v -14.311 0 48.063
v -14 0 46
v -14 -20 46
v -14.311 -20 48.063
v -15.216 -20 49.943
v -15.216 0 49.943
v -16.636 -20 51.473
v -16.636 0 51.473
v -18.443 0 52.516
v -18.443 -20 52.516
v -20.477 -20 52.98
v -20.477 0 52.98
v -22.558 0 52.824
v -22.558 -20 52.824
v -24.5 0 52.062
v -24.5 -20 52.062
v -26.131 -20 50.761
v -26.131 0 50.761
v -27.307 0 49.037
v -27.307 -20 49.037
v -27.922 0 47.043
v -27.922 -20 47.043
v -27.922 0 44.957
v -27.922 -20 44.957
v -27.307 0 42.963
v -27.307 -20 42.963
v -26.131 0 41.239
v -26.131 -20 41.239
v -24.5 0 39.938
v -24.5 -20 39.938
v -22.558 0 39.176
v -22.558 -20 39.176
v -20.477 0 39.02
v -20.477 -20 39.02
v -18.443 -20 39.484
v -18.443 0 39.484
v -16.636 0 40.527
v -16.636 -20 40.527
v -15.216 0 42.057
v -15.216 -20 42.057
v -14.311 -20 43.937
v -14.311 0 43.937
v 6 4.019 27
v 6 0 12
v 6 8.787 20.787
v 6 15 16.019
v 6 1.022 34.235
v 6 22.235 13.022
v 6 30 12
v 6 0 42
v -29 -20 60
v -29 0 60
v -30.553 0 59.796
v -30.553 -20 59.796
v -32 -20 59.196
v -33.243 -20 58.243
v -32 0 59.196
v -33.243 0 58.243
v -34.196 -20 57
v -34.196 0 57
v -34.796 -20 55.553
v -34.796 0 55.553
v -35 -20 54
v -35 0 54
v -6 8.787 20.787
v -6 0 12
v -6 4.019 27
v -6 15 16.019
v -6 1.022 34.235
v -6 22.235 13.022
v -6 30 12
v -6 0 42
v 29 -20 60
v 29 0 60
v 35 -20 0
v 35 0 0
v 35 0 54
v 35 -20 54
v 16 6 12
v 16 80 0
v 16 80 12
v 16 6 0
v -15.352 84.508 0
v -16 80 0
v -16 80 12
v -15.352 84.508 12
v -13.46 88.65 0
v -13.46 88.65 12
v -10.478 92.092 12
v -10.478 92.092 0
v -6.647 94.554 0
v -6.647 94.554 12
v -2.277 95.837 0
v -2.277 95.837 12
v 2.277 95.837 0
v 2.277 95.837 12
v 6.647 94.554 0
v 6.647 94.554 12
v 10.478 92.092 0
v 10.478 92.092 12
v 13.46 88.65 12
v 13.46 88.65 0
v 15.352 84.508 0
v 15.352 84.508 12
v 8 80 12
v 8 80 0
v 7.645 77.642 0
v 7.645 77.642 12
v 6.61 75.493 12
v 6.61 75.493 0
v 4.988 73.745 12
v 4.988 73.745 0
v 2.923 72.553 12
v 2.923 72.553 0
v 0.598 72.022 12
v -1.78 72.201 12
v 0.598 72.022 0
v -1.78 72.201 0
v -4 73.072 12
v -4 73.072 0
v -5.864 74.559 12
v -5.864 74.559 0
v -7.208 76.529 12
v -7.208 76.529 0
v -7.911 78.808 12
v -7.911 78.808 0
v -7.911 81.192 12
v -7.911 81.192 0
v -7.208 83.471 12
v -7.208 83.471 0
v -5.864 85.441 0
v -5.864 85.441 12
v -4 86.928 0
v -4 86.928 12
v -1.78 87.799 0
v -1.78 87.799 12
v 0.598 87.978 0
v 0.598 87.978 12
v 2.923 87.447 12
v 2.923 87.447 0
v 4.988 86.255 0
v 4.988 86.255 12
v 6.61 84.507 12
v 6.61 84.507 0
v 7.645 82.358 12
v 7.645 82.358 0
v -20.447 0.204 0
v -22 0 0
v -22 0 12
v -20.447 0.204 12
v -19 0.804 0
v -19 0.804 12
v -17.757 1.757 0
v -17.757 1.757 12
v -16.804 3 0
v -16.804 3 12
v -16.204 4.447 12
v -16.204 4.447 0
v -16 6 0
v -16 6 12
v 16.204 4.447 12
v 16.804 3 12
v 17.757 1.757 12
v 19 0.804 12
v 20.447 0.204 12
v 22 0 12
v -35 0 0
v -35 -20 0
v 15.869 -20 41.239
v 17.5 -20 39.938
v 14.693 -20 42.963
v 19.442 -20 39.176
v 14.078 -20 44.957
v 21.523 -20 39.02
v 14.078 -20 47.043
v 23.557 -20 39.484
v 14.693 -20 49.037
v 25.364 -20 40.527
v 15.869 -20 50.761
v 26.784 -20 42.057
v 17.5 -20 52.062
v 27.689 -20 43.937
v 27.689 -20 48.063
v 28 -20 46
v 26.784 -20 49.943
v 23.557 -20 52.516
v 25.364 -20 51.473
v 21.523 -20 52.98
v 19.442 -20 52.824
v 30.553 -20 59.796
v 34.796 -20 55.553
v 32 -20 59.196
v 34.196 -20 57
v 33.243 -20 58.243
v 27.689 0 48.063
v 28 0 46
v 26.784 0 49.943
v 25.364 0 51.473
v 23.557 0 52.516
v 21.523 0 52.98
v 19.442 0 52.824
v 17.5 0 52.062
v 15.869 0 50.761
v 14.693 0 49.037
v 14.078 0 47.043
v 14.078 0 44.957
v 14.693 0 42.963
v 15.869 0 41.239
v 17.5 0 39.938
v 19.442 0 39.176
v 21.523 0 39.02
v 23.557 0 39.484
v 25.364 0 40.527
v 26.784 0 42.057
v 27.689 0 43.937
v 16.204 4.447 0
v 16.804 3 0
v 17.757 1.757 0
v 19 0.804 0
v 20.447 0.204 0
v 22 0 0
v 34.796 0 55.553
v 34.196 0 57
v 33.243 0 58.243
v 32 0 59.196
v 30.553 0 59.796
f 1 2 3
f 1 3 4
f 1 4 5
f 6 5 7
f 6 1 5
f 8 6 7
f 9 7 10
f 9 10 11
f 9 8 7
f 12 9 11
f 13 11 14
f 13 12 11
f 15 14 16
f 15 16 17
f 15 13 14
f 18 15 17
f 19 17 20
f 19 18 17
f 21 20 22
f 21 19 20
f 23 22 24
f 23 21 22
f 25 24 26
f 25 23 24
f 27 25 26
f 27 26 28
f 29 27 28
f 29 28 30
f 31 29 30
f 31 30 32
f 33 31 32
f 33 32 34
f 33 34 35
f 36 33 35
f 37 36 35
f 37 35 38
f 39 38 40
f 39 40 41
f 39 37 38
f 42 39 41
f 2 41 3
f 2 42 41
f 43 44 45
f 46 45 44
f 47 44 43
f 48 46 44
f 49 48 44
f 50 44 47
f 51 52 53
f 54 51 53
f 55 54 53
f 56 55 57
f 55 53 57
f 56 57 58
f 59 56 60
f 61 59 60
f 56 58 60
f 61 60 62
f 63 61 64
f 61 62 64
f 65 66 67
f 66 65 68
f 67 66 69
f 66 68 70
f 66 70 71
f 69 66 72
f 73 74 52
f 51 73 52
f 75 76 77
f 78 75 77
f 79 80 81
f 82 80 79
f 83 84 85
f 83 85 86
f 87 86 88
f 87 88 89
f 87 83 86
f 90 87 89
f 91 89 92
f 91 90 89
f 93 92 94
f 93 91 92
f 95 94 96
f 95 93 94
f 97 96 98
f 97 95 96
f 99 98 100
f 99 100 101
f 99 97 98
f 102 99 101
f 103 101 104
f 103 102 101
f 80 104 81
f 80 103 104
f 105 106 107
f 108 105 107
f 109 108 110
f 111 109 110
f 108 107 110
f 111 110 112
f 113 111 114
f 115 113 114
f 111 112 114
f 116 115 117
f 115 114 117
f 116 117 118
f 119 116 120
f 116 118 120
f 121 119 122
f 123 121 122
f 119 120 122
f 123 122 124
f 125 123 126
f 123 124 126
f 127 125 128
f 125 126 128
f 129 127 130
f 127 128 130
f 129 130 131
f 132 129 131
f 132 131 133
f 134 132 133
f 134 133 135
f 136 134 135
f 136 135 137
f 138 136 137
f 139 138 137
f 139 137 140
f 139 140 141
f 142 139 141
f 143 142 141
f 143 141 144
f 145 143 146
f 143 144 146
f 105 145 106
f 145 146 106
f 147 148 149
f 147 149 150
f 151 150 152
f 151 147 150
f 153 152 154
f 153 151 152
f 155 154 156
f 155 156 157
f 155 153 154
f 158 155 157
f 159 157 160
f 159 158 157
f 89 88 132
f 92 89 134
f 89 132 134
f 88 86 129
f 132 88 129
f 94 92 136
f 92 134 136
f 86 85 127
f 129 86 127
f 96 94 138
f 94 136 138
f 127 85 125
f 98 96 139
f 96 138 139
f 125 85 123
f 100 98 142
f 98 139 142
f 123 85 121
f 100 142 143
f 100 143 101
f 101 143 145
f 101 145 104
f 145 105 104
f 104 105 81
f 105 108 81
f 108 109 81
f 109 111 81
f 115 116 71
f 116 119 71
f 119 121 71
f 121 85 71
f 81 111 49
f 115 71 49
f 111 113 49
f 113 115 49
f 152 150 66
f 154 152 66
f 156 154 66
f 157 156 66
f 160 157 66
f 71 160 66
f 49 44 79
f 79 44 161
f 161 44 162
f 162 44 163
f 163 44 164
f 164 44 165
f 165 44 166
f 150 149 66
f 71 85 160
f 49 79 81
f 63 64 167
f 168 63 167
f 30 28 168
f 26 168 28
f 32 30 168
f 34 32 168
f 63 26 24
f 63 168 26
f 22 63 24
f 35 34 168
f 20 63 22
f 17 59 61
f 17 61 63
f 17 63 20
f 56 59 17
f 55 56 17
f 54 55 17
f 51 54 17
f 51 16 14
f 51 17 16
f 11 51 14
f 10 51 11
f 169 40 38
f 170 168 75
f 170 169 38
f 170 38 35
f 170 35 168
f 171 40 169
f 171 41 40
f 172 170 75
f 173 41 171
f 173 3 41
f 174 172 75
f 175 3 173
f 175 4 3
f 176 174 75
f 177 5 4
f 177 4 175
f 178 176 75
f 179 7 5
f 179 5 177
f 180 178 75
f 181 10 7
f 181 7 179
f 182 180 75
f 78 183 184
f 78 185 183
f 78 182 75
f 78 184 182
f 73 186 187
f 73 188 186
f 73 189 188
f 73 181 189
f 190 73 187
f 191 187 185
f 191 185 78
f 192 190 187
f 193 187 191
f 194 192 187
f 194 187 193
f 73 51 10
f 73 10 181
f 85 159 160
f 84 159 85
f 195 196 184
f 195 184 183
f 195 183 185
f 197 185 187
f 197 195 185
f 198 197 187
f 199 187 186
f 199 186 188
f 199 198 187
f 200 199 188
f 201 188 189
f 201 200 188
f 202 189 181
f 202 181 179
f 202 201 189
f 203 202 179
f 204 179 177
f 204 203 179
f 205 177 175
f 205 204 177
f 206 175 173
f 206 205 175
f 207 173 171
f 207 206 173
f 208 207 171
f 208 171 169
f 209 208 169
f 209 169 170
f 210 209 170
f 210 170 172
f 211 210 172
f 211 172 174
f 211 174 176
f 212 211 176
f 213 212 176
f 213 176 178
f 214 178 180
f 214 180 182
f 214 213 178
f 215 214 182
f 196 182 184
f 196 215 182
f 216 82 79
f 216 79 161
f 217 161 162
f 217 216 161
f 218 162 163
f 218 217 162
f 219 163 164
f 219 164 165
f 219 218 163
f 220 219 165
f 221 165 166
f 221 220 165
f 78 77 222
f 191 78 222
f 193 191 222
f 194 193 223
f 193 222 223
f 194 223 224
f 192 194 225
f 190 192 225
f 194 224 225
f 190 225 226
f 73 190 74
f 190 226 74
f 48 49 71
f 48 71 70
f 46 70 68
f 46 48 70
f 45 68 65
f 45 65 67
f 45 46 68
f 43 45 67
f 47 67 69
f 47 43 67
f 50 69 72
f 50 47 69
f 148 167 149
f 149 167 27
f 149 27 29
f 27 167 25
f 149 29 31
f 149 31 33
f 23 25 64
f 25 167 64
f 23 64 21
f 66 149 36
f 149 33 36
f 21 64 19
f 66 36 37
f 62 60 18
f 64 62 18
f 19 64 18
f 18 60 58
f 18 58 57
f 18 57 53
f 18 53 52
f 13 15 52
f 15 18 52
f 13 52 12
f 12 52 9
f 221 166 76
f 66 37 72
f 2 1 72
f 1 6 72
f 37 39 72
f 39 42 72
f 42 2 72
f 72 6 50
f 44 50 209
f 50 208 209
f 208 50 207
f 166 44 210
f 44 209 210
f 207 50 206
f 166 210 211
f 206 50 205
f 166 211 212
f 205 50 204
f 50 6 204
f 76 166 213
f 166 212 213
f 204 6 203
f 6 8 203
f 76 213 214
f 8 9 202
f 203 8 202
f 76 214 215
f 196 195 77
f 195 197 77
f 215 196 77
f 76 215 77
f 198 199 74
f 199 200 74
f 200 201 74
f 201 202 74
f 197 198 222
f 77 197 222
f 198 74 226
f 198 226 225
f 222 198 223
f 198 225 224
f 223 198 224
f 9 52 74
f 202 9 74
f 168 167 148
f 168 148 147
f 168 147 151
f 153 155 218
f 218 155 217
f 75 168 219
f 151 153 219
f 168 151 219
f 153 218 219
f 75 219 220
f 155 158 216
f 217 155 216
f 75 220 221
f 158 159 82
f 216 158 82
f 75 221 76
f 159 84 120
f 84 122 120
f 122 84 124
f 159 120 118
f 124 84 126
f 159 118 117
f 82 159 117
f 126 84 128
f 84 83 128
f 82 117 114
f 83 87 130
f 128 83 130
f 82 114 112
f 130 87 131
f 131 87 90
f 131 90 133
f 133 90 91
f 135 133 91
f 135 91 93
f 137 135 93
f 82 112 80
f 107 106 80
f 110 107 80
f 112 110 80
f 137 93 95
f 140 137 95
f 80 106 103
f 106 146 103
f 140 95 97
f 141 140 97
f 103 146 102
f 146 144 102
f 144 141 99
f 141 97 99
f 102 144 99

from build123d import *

# Parameters (mm, degrees)
F0_R     = 7
F1_DEPTH = 20
F2_R     = 8
F3_DEPTH = 12
F5_DEPTH = 25
F8_DEPTH = 6


with BuildPart() as f1:
    # F0 (on Front) → F1 (new body)
    with BuildSketch(Plane.XZ):
        with BuildLine():
            Line((-35, 54), (-35, 0))
            Line((-35, 0), (35, 0))
            Line((35, 0), (35, 54))
            ThreePointArc((35, 54), (33.242641, 58.242641), (29, 60))
            Line((29, 60), (-29, 60))
            ThreePointArc((-29, 60), (-33.242641, 58.242641), (-35, 54))
        make_face()
        with Locations((-21, 46)):
            Circle(F0_R, mode=Mode.SUBTRACT)
        with Locations((21, 46)):
            Circle(F0_R, mode=Mode.SUBTRACT)
    extrude(amount=F1_DEPTH)

    # F2 (on face) → F3 (join)
    with BuildSketch(Plane(origin=(0, 0, 0), x_dir=(1, 0, 0), z_dir=(0, 0, -1))):
        with BuildLine():
            Line((22, 0), (-22, 0))
            ThreePointArc((-22, 0), (-17.757359, -1.757359), (-16, -6))
            Line((-16, -6), (-16, -80))
            ThreePointArc((-16, -80), (0, -96), (16, -80))
            Line((16, -80), (16, -6))
            ThreePointArc((16, -6), (17.757359, -1.757359), (22, 0))
        make_face()
        with Locations((0, -80)):
            Circle(F2_R, mode=Mode.SUBTRACT)
    extrude(amount=-F3_DEPTH)

    # F7 (on Right) → F8 (join, symmetric)
    with BuildSketch(Plane.YZ):
        with BuildLine():
            Line((0, 12), (30, 12))
            ThreePointArc((30, 12), (8.786797, 20.786797), (0, 42))
            Line((0, 42), (0, 12))
        make_face()
    extrude(amount=F8_DEPTH, both=True)


with BuildPart() as f5:
    # F4 (on Right) → F5 (new body)
    with BuildSketch(Plane.YZ):
        Polygon((8.827168, -95.900685), (44.855885, -95.900685), (44.855885, -23.484161), (8.827168, -23.484161), (8.827168, -49.02795), (8.827168, -76.342739), align=None)
    extrude(amount=F5_DEPTH)


solid = f1.part
